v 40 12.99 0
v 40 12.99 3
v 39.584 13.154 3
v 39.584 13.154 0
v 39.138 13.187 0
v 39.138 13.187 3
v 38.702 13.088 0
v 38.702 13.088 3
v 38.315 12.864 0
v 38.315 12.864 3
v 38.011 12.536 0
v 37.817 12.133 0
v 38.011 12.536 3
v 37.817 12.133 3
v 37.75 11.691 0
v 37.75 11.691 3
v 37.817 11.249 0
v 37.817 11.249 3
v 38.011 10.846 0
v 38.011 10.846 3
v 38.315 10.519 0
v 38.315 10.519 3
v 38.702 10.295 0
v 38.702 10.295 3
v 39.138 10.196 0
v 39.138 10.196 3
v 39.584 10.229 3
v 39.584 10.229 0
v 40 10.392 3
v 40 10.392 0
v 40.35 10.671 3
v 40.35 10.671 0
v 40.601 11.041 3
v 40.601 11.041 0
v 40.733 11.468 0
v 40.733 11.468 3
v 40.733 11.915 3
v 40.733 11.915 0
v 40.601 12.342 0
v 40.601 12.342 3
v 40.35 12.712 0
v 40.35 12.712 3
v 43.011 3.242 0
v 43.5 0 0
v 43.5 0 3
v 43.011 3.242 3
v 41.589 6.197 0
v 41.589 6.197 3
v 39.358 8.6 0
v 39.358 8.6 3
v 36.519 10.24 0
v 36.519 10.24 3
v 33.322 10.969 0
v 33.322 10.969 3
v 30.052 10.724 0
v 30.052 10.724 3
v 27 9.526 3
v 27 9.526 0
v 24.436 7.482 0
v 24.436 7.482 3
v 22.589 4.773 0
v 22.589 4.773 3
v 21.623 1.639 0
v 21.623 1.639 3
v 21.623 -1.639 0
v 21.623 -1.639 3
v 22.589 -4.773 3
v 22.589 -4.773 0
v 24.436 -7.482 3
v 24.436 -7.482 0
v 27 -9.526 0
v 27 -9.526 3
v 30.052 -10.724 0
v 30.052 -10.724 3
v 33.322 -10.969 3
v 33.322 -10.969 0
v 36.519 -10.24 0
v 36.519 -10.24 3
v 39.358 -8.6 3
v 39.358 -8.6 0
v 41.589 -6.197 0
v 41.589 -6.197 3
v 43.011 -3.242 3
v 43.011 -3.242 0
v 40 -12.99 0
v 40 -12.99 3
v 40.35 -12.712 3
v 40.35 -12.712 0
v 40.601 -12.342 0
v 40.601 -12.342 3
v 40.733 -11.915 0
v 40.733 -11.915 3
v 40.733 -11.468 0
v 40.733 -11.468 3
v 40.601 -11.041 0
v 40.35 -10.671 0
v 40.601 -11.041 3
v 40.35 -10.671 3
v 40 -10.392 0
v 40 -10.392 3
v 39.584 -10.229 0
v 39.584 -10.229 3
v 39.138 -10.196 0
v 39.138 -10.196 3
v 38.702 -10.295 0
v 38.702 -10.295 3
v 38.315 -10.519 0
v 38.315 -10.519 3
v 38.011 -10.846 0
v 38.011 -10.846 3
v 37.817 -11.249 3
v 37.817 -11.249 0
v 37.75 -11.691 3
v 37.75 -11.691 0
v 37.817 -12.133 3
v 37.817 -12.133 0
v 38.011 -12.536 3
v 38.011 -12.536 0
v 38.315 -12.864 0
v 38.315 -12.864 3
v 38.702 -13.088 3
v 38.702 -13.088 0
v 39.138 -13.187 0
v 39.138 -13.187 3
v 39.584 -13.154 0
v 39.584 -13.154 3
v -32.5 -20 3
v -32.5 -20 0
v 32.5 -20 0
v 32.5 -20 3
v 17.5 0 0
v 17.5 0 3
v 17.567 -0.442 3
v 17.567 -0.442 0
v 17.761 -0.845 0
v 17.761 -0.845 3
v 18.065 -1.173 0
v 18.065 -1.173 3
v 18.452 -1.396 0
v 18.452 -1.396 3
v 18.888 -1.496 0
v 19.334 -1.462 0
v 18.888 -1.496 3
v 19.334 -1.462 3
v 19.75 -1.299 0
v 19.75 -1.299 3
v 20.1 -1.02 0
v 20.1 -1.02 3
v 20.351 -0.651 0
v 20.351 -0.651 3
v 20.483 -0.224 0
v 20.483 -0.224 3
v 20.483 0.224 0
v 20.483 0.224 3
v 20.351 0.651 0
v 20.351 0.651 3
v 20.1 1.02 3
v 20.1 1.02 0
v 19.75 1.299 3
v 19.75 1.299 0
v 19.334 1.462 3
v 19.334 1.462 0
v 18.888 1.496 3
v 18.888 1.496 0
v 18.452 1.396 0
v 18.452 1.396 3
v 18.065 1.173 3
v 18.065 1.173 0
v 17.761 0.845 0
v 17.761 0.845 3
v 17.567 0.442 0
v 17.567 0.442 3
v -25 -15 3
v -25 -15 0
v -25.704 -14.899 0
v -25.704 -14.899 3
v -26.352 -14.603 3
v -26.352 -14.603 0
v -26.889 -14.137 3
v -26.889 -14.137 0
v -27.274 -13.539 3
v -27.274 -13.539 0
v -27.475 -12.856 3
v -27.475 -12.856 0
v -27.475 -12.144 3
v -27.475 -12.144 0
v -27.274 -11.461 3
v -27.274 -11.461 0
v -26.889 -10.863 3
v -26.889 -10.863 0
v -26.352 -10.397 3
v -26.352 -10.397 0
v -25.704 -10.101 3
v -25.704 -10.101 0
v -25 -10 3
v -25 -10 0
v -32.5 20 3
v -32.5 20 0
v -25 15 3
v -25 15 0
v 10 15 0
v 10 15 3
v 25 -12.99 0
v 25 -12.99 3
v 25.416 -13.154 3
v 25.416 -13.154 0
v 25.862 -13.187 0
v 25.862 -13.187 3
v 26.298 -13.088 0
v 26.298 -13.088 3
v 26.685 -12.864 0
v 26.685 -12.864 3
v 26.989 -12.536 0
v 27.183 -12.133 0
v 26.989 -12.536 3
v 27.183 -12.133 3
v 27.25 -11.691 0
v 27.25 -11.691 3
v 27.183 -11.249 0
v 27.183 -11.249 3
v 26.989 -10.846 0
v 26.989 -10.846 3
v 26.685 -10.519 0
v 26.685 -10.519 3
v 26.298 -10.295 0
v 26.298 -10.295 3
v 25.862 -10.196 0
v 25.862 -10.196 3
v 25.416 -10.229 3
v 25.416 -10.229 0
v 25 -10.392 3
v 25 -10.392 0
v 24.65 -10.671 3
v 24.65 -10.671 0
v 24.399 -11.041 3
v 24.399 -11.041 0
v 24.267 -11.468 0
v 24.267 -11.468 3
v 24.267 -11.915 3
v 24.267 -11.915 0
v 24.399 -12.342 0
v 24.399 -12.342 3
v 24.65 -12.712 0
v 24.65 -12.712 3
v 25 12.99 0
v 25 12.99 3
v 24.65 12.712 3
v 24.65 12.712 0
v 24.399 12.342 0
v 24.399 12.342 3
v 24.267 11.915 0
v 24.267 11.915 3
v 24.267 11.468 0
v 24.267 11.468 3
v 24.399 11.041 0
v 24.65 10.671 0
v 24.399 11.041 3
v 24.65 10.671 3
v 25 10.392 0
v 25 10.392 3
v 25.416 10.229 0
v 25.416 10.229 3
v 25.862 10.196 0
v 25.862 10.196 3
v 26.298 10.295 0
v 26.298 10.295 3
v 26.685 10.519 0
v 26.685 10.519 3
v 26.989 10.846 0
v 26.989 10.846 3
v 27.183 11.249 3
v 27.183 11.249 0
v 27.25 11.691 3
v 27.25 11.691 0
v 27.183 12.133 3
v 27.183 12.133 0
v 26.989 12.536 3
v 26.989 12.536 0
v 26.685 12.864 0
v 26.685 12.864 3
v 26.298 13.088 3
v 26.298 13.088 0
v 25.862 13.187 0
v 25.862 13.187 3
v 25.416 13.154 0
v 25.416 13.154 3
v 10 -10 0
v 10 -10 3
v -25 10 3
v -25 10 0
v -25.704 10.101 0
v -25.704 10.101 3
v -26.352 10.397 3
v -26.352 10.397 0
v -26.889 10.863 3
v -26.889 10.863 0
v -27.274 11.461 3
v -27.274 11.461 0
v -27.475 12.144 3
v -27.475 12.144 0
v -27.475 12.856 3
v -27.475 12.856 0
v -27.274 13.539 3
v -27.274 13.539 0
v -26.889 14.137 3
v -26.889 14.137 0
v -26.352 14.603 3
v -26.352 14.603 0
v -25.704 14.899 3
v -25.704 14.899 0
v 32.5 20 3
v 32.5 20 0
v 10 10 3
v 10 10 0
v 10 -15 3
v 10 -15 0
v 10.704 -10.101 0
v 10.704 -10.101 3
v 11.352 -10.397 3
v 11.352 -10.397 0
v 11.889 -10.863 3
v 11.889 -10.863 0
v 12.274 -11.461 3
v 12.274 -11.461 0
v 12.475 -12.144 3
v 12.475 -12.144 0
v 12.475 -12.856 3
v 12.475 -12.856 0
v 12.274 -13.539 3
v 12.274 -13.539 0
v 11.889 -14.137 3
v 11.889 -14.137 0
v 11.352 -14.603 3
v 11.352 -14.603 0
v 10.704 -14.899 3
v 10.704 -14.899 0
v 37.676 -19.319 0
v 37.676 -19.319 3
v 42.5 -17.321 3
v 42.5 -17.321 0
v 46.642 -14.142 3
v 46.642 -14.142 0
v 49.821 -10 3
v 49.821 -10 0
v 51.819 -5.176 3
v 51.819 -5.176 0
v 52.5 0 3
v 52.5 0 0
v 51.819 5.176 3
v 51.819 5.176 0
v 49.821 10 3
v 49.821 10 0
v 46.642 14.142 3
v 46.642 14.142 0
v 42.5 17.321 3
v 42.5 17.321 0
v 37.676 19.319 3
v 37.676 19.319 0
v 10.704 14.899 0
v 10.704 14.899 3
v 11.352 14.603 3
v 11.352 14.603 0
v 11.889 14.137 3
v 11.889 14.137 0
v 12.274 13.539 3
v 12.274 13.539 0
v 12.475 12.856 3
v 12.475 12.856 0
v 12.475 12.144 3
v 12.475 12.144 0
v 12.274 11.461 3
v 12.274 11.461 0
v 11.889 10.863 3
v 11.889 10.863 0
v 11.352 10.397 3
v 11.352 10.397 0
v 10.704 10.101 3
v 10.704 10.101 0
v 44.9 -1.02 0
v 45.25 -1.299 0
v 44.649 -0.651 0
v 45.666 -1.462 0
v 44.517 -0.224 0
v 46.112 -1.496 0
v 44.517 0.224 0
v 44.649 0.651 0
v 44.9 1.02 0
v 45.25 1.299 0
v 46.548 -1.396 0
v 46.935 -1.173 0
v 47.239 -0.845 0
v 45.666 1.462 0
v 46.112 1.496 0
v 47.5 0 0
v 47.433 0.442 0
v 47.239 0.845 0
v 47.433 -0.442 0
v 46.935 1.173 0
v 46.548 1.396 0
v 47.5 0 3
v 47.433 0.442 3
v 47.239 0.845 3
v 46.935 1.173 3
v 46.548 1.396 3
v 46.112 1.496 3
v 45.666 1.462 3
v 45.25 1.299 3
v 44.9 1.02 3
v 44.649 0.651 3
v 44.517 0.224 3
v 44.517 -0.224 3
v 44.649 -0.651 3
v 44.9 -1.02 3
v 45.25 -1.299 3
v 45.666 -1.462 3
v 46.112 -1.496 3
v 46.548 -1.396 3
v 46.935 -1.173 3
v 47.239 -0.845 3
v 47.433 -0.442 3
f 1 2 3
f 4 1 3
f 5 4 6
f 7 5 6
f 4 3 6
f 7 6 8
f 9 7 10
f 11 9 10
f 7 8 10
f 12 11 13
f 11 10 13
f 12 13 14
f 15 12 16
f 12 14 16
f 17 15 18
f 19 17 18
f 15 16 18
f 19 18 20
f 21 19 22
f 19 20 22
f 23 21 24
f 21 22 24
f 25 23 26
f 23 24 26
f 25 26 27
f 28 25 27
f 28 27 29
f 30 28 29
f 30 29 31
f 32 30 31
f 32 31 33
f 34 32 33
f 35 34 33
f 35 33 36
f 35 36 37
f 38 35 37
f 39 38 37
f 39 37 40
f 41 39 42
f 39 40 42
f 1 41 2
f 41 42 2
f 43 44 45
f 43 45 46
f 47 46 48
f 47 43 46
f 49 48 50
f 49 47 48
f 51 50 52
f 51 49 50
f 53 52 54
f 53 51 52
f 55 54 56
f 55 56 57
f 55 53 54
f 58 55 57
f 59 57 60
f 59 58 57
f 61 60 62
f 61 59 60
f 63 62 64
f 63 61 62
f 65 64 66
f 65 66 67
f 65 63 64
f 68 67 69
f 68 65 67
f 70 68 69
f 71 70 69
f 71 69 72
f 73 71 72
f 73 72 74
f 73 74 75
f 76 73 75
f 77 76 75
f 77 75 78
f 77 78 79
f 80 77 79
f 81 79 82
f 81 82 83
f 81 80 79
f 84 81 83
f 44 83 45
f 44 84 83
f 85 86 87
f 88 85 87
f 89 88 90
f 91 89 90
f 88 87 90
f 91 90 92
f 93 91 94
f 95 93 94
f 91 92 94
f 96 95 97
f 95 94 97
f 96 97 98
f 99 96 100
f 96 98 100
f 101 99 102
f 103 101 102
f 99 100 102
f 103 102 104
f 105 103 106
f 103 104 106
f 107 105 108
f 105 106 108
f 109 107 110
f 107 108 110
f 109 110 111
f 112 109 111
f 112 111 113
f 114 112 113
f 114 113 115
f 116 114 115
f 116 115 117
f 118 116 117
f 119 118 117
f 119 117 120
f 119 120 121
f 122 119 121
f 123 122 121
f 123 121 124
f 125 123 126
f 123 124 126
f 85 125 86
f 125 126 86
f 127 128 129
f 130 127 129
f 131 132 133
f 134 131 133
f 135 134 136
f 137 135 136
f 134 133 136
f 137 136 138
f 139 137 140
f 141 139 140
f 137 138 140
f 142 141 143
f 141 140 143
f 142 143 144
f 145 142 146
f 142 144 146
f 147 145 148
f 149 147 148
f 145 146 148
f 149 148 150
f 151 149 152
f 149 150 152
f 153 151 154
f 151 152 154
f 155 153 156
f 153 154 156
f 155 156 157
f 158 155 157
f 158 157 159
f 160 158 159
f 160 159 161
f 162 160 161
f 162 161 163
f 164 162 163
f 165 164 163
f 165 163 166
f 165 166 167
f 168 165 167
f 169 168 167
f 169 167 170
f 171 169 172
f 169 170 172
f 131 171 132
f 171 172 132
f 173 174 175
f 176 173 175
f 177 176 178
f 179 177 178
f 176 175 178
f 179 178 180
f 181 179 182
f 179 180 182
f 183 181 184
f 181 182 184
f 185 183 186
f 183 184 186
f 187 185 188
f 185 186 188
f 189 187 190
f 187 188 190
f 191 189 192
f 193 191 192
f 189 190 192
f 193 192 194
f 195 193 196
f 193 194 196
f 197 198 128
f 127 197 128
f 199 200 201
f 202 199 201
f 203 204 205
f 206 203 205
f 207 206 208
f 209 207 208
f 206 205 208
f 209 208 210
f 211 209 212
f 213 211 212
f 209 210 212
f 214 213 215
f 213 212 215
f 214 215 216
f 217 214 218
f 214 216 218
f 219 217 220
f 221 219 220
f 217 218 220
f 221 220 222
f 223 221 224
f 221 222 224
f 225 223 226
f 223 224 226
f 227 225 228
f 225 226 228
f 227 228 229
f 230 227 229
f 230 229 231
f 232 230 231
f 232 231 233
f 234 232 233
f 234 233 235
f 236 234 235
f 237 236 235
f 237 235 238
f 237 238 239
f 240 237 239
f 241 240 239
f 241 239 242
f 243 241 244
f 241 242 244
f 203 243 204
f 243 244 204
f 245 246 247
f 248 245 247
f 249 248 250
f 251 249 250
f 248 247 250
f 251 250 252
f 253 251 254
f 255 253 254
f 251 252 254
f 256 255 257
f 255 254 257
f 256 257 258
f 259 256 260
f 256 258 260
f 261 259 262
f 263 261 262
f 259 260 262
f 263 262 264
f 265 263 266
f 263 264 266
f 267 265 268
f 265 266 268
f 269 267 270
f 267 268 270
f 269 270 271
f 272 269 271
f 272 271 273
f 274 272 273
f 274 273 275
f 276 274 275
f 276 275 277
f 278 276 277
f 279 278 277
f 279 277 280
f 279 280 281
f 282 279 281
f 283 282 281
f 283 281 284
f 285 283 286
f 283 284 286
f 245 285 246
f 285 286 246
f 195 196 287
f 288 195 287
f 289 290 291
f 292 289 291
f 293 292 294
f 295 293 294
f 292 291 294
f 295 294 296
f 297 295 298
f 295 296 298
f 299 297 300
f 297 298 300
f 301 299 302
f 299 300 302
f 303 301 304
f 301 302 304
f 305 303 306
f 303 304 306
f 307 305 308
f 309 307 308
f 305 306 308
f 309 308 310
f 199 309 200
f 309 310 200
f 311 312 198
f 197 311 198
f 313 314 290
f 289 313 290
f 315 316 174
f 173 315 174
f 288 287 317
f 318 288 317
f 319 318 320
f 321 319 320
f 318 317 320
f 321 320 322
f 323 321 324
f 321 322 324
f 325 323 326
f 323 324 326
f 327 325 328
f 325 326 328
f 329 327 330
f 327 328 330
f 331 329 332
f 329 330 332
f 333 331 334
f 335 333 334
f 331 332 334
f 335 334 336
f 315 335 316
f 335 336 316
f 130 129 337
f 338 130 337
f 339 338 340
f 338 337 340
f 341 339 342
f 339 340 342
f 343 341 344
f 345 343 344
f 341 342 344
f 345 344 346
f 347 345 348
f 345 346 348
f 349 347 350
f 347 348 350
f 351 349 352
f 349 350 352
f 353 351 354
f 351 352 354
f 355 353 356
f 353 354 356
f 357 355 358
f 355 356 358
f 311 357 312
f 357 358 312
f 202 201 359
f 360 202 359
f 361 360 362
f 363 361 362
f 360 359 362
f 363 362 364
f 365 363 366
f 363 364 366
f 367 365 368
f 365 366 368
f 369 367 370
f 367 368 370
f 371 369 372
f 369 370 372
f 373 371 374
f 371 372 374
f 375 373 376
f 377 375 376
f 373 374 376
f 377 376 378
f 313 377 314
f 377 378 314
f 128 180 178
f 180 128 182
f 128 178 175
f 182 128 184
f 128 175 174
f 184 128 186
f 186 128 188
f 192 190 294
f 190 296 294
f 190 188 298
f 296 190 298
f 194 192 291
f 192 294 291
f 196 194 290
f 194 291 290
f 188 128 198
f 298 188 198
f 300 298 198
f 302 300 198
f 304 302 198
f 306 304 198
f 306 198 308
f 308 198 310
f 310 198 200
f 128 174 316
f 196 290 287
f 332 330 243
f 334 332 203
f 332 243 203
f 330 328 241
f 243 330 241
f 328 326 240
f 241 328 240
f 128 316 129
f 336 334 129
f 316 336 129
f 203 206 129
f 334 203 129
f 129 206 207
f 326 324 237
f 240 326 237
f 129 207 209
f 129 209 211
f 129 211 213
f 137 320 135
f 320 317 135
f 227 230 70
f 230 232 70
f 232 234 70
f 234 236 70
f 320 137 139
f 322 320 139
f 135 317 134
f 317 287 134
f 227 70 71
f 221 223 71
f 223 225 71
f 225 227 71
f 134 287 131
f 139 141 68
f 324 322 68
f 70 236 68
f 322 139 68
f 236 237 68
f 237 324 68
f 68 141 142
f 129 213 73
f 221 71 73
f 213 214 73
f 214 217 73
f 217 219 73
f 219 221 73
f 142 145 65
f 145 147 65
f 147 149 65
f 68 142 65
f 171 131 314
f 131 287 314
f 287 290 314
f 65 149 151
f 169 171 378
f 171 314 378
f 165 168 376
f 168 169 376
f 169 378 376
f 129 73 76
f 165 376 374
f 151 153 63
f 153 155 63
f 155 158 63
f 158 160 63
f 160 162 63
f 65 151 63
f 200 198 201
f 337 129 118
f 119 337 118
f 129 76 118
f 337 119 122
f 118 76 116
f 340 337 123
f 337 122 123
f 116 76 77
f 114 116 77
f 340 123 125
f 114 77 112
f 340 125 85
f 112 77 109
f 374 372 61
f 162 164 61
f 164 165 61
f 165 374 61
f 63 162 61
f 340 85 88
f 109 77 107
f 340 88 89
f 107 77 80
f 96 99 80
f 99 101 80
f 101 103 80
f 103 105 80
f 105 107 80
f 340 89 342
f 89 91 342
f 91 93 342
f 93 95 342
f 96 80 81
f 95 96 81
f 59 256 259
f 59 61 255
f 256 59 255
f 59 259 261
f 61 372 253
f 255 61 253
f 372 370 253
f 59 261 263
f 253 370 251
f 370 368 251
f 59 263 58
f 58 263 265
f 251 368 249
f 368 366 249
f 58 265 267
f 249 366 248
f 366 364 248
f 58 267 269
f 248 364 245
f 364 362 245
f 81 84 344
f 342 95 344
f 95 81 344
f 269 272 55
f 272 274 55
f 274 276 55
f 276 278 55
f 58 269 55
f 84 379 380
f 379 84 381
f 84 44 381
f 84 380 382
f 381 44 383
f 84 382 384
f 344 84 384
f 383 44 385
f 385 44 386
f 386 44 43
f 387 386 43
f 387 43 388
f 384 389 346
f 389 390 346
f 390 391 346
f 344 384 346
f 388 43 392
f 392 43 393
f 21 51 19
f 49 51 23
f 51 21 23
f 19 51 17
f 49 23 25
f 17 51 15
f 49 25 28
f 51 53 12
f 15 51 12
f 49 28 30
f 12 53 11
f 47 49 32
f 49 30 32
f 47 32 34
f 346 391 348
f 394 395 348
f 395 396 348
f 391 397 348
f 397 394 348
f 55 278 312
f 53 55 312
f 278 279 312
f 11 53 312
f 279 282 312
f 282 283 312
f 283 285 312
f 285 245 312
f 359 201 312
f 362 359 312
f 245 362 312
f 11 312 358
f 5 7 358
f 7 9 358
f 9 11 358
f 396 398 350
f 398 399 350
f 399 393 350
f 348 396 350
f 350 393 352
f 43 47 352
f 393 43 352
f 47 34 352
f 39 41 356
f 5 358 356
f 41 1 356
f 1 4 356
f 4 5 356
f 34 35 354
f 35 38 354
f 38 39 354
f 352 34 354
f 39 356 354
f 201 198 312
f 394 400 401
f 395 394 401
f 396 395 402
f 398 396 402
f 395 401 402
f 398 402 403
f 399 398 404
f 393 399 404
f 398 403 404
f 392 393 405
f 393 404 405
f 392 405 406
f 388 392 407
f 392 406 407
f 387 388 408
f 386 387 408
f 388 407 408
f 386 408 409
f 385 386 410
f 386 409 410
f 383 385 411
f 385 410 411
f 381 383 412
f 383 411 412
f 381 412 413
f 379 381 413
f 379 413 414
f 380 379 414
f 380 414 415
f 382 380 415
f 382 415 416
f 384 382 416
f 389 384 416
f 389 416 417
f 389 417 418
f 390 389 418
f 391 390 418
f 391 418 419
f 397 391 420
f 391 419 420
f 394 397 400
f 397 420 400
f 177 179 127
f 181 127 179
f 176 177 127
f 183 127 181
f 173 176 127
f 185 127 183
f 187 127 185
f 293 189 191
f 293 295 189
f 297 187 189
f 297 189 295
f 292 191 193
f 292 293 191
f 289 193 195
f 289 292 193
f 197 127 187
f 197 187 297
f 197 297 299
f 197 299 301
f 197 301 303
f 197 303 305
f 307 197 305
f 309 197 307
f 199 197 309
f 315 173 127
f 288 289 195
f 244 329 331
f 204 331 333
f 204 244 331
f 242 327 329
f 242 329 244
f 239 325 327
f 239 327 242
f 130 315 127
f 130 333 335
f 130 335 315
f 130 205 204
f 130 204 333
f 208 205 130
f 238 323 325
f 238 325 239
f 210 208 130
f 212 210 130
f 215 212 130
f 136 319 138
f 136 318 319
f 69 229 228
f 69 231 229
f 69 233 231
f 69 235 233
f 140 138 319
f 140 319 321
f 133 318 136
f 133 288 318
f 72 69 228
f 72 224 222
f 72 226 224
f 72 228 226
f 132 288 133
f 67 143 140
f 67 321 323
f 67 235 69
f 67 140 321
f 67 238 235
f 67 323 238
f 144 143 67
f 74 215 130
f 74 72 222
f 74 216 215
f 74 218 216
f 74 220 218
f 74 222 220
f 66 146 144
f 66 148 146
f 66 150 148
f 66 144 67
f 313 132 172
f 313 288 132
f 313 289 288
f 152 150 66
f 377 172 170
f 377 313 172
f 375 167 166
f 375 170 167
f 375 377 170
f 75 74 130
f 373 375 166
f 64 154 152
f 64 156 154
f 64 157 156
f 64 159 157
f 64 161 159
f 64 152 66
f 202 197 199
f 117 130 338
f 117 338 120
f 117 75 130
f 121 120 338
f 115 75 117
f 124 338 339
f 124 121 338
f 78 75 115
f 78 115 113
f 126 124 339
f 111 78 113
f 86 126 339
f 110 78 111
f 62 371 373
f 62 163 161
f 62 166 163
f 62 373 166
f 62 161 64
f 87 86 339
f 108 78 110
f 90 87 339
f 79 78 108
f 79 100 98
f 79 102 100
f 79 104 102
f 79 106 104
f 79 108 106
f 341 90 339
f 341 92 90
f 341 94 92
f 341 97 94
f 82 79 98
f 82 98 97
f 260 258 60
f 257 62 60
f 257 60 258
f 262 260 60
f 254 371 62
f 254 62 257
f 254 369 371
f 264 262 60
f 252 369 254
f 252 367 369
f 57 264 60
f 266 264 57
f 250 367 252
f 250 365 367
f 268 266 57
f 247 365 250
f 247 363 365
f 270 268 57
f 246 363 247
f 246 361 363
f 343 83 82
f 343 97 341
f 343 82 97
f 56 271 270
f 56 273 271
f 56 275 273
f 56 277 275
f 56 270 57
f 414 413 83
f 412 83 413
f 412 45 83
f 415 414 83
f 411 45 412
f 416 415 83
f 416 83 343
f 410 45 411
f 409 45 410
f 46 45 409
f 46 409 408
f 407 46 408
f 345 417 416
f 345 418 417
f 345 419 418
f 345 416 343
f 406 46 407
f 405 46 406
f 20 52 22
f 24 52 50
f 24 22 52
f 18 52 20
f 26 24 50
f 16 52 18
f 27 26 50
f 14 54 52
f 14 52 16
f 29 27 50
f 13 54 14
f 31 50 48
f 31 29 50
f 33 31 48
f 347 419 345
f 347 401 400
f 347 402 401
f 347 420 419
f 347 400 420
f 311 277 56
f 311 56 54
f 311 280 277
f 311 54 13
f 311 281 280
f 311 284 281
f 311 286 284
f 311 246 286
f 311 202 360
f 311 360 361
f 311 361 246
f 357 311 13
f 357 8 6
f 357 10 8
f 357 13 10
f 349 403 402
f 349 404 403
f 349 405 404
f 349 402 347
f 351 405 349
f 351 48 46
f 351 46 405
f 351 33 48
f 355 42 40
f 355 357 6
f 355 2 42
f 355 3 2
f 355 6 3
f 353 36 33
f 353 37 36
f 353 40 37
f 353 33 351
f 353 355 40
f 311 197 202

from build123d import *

# Parameters (mm, degrees)
SKETCH1_R           = 11
BOSS_EXTRUDE1_DEPTH = 3
SKETCH2_R           = 1.5
CUT_EXTRUDE1_DEPTH  = 3
CIRPATTERN1_COUNT   = 6


with BuildPart() as part:
    # Sketch1 → Boss-Extrude1 (new body)
    with BuildSketch(Plane.XY):
        with BuildLine():
            Line((32.5, 20), (-32.5, 20))
            Line((-32.5, 20), (-32.5, -20))
            Line((-32.5, -20), (32.5, -20))
            ThreePointArc((32.5, -20), (52.5, 0), (32.5, 20))
        make_face()
        with Locations((32.5, 0)):
            Circle(SKETCH1_R, mode=Mode.SUBTRACT)
        with BuildLine():
            Line((-25, 15), (10, 15))
            ThreePointArc((10, 15), (12.5, 12.5), (10, 10))
            Line((10, 10), (-25, 10))
            ThreePointArc((-25, 10), (-27.5, 12.5), (-25, 15))
        make_face(mode=Mode.SUBTRACT)
        with BuildLine():
            Line((-25, -10), (10, -10))
            ThreePointArc((10, -10), (12.5, -12.5), (10, -15))
            Line((10, -15), (-25, -15))
            ThreePointArc((-25, -15), (-27.5, -12.5), (-25, -10))
        make_face(mode=Mode.SUBTRACT)
    extrude(amount=BOSS_EXTRUDE1_DEPTH)

    # Sketch2 → Cut-Extrude1 (cut)
    with BuildSketch(Plane.XY.offset(3)):
        with Locations((46, 0)):
            Circle(SKETCH2_R)
    cut_extrude1 = extrude(amount=-CUT_EXTRUDE1_DEPTH, mode=Mode.SUBTRACT)

    # CirPattern1: Cut-Extrude1 ×6 about axis
    cirpattern1_axis = Axis((32.5, 0, 0), (0, 0, 1))
    for i in range(1, CIRPATTERN1_COUNT):
        add(cut_extrude1.rotate(cirpattern1_axis, i * 360 / CIRPATTERN1_COUNT), mode=Mode.SUBTRACT)


solid = part.part
